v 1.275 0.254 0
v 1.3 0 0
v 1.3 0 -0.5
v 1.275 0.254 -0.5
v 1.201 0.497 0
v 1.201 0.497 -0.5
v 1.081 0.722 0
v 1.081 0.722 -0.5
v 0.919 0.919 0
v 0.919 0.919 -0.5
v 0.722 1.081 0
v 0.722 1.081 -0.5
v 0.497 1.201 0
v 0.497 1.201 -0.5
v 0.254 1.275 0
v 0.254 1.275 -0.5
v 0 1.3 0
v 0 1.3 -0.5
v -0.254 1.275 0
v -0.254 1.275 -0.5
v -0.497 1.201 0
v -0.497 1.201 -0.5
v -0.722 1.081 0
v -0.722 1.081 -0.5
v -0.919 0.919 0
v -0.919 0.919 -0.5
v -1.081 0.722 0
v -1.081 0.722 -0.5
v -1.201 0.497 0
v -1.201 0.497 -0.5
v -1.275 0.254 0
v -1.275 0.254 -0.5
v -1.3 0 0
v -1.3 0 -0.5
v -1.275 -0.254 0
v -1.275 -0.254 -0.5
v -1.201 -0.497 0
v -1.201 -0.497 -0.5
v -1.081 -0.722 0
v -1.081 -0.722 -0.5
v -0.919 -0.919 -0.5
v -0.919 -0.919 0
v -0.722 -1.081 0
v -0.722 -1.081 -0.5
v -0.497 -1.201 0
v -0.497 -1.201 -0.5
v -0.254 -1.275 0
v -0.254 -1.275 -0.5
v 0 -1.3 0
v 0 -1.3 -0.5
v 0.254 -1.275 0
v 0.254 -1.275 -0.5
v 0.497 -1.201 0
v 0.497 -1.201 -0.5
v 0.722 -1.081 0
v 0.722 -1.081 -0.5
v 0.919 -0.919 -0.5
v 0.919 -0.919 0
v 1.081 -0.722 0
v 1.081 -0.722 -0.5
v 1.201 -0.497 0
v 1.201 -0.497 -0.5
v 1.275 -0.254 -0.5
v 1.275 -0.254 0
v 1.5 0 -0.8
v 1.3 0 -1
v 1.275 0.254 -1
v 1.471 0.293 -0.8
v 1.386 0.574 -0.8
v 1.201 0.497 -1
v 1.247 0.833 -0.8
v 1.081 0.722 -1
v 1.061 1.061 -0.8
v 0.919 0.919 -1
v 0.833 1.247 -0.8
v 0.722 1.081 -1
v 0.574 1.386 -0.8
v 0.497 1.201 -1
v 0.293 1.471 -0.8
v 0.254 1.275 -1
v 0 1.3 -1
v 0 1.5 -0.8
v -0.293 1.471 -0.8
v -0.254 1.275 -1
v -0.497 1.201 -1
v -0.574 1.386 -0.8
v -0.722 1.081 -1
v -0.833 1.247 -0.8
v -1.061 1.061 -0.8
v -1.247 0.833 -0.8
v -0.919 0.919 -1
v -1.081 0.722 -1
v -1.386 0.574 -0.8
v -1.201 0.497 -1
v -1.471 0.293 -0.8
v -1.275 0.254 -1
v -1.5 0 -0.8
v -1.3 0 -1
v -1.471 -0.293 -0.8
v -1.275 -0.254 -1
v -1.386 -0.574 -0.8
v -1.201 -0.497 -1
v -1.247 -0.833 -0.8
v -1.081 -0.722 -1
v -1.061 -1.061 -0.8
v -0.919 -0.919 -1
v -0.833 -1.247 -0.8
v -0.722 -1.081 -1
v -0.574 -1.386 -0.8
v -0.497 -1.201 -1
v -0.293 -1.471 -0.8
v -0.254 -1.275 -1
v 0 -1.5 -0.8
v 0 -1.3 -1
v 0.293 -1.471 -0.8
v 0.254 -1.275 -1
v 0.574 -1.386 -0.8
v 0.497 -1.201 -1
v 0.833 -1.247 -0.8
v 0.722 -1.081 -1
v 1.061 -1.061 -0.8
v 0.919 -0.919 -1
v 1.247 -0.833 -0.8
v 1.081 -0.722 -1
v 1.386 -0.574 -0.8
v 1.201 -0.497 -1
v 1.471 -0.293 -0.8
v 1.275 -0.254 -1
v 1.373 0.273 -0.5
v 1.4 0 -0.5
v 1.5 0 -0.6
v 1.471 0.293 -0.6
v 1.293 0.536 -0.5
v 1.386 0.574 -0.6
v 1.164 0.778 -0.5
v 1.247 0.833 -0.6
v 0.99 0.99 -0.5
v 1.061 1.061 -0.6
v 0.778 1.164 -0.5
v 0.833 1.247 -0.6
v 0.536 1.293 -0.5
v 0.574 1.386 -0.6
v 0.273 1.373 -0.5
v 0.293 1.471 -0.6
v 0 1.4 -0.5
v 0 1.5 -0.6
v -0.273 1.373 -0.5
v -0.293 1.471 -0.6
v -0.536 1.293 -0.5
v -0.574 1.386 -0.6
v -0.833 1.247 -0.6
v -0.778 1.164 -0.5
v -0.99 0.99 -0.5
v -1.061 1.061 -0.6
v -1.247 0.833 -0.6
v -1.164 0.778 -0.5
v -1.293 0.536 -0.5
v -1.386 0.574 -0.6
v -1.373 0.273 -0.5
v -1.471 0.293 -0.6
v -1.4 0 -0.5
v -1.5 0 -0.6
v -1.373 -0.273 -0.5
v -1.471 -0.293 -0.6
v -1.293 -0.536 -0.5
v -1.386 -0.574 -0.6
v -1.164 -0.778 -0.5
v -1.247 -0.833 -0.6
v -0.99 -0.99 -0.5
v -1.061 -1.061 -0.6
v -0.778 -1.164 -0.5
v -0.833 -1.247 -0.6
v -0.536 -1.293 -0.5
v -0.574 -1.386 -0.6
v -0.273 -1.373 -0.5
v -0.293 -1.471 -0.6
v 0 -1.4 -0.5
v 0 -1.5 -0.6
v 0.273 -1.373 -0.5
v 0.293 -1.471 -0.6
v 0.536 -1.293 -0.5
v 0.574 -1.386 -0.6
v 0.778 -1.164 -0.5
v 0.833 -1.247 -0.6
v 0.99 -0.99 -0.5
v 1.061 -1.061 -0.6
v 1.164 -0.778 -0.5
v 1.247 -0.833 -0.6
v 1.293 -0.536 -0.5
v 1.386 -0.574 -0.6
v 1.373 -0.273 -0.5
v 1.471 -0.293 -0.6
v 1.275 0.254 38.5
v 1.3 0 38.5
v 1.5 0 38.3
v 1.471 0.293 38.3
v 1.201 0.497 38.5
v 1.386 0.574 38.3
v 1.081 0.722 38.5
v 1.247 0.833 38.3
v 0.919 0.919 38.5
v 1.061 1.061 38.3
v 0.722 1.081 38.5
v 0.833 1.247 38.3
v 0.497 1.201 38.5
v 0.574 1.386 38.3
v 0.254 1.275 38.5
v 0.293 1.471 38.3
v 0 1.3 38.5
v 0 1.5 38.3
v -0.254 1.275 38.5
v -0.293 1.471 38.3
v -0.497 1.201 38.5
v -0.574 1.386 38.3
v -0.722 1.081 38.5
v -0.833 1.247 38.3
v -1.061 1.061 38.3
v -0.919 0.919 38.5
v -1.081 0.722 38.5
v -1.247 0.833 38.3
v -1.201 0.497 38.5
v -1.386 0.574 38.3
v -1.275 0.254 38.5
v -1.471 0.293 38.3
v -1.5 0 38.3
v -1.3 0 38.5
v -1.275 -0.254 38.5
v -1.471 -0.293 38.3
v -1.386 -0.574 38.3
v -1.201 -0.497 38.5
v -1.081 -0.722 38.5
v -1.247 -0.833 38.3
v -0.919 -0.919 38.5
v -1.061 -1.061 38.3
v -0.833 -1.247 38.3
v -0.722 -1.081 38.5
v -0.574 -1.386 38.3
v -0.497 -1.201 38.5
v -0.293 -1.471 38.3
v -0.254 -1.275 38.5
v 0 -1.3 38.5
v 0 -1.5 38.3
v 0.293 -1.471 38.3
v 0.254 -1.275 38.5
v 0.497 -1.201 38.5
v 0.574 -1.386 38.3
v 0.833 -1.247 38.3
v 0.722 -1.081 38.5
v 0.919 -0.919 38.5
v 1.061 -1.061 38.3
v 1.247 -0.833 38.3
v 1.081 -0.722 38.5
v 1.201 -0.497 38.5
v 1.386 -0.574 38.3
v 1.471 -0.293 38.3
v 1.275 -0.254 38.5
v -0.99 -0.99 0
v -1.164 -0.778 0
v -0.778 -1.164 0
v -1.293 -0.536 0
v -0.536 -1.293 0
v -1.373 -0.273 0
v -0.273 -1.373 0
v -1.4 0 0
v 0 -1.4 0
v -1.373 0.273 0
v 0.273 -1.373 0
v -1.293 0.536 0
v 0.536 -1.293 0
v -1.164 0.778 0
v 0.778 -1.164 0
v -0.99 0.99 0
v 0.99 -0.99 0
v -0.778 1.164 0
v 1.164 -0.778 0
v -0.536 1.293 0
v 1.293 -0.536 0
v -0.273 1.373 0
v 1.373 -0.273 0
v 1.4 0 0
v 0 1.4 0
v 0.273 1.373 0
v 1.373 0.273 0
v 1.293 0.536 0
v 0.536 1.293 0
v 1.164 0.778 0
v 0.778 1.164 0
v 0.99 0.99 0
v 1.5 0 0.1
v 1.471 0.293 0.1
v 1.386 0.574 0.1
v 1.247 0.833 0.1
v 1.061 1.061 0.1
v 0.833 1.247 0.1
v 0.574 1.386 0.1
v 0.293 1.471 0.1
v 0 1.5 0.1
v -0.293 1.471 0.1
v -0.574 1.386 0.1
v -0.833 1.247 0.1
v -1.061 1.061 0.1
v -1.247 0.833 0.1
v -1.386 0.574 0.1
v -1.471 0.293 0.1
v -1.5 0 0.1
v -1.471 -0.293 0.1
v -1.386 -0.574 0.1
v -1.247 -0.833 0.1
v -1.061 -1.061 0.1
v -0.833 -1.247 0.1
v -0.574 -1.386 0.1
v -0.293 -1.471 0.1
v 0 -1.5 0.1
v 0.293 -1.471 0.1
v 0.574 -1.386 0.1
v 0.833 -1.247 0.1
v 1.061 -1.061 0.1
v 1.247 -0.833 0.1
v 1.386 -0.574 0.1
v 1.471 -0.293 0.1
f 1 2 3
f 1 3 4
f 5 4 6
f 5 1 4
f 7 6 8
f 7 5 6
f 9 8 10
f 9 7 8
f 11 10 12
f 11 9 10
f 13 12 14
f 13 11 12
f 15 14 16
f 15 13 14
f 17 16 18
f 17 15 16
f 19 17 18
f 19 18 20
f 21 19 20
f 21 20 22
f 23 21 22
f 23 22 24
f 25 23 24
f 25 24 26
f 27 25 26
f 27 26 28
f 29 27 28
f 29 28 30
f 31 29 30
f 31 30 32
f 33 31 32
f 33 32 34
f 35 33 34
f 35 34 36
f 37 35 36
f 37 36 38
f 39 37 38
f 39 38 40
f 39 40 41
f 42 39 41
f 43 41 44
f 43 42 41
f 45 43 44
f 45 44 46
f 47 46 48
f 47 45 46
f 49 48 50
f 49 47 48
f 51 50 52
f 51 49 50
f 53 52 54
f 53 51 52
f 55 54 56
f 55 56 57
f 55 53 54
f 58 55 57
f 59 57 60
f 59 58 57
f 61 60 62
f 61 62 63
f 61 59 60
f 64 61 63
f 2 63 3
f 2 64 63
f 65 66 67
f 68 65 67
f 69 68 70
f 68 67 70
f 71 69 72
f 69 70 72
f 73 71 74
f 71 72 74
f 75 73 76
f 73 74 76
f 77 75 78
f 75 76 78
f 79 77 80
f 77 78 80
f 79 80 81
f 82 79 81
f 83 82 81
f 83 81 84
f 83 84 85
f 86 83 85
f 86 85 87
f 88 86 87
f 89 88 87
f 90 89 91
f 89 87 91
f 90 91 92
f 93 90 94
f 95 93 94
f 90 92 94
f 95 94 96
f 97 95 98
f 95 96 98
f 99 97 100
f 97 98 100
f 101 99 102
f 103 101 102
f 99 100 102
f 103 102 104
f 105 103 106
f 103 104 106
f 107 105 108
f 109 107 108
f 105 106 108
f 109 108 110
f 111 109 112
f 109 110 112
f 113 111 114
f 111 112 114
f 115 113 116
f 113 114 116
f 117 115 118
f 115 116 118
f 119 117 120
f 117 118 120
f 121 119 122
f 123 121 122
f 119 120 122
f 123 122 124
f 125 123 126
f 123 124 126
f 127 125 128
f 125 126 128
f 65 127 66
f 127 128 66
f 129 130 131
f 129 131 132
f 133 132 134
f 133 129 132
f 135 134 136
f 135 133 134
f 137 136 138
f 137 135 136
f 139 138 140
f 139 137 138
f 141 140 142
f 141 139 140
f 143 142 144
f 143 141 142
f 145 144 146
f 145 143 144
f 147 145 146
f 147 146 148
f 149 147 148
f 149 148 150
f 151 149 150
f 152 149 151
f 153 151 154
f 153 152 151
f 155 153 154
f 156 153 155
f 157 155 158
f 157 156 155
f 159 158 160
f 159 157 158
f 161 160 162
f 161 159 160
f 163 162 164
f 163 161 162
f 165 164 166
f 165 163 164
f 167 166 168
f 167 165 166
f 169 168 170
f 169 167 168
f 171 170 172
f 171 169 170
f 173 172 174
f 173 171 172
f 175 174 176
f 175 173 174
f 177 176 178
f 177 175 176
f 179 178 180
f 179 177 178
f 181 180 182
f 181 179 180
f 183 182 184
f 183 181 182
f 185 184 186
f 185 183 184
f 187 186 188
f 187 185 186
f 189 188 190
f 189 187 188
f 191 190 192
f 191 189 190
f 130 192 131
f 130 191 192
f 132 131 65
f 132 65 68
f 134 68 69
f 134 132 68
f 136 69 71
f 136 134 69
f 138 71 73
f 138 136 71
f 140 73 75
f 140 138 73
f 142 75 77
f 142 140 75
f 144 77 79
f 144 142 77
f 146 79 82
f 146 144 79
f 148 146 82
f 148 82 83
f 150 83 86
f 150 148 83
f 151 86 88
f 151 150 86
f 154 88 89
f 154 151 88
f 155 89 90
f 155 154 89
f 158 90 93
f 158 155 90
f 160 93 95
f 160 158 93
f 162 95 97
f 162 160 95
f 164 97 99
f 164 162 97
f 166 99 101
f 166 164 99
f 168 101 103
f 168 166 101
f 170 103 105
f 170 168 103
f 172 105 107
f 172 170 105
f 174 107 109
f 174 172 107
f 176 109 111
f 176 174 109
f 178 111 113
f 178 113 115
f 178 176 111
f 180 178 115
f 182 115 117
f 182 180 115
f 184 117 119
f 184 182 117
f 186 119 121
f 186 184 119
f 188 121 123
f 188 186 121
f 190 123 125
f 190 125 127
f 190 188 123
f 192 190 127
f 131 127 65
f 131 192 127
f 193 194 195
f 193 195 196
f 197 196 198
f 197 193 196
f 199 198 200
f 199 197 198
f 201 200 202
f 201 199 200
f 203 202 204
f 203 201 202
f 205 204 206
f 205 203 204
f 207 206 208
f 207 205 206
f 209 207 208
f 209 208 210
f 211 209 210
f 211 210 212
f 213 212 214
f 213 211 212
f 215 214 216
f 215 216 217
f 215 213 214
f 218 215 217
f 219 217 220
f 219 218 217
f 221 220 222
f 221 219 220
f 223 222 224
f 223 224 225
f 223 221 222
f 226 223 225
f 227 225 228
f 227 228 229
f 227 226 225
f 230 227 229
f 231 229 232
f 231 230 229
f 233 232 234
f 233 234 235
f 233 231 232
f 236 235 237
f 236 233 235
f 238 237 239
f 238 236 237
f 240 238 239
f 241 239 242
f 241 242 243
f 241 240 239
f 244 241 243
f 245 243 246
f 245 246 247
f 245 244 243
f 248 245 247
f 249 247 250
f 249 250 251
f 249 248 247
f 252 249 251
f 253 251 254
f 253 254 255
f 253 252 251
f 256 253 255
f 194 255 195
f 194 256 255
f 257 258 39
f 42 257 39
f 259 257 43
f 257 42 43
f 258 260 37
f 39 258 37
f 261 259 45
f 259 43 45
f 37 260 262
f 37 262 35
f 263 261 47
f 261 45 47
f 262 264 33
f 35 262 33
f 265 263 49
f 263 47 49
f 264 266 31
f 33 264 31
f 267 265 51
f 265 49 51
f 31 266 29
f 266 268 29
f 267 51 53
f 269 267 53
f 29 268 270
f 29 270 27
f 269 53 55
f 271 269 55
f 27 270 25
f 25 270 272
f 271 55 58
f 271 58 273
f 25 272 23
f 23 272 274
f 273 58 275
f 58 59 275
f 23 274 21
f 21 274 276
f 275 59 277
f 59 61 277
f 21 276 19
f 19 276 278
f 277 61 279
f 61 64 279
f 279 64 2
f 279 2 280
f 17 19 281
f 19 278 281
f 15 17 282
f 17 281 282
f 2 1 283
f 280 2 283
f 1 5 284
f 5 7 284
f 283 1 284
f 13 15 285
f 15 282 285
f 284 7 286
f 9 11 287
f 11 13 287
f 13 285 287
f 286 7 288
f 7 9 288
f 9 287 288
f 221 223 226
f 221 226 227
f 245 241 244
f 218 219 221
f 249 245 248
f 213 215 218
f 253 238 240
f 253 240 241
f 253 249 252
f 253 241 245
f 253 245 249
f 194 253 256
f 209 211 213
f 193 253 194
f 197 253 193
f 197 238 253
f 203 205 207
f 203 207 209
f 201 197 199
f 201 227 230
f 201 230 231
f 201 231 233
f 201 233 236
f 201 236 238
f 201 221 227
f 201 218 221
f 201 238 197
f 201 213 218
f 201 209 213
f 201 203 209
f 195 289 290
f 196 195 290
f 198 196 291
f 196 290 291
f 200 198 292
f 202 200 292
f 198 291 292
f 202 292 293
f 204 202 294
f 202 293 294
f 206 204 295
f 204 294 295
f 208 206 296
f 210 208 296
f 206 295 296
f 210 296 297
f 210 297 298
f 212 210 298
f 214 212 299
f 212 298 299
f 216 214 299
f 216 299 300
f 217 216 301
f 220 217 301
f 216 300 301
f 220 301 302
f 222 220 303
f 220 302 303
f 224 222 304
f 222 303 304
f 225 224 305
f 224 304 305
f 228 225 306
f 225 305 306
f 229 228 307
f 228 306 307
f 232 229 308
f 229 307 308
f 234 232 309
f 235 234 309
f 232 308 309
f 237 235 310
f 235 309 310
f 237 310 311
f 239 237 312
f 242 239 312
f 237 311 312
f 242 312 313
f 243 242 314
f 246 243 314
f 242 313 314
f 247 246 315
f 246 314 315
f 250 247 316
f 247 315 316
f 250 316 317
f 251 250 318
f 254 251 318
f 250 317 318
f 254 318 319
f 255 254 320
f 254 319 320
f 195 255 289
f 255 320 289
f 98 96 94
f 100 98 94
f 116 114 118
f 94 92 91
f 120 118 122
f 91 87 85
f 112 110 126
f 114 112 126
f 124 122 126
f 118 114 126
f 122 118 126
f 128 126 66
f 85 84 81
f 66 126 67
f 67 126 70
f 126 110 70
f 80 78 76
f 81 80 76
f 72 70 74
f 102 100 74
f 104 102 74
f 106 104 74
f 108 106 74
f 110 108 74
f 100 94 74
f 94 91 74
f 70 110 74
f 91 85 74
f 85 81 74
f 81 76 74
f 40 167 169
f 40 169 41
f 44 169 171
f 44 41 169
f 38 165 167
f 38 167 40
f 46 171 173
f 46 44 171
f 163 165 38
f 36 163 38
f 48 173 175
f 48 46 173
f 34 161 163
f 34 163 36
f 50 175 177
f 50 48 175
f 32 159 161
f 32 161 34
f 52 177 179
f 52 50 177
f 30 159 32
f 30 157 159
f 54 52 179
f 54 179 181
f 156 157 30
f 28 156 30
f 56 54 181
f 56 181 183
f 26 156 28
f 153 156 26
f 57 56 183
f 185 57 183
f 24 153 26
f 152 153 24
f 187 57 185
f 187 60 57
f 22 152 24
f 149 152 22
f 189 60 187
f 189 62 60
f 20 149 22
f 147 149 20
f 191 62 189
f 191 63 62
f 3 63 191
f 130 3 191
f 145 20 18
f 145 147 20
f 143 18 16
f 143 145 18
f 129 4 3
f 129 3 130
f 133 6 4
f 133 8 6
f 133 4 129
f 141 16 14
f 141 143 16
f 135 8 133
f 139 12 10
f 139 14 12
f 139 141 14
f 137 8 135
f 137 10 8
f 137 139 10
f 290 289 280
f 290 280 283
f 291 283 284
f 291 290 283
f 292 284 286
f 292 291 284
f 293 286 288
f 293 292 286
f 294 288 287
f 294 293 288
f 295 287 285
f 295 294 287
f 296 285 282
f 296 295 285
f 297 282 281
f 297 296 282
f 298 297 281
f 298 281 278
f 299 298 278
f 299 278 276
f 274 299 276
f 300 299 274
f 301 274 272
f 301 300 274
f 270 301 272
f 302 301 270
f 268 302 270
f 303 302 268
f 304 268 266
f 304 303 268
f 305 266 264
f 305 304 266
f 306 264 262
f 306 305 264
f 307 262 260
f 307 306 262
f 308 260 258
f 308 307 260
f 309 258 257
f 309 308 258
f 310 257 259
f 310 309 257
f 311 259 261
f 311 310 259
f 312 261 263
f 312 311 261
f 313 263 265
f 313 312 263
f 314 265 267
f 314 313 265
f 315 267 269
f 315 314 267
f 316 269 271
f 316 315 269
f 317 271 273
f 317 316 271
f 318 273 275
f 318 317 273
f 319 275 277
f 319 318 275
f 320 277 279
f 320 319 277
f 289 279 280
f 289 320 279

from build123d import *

# Parameters (mm, degrees)
F0_R     = 1.5
F0_R_2   = 1.3
F1_DEPTH = 38.5
F2_DEPTH = 1
F3_START = -0.5
F3_DEPTH = 0.5
F4_SIZE  = 0.2
F5_SIZE  = 0.1


with BuildPart() as f1:
    # F0 (on Top) → F1 (new body)
    with BuildSketch(Plane.XY):
        Circle(F0_R)
        Circle(F0_R_2, mode=Mode.SUBTRACT)
        Circle(F0_R_2)
    extrude(amount=F1_DEPTH)

    # F0 (on Top) → F2 (join)
    with BuildSketch(Plane.XY):
        Circle(F0_R_2)
    extrude(amount=-F2_DEPTH)

    # F0 (on Top) → F3 (join)
    with BuildSketch(Plane.XY.offset(F3_START)):
        Circle(F0_R)
        Circle(F0_R_2, mode=Mode.SUBTRACT)
    extrude(amount=-F3_DEPTH)

    # F4
    f4_edges = [f1.edges().sort_by_distance(p)[0] for p in [
        (-1.5, 0, -1),
        (-1.5, 0, 38.5),
    ]]
    chamfer(f4_edges, length=F4_SIZE)

    # F5
    f5_edges = [f1.edges().sort_by_distance(p)[0] for p in [
        (-1.5, 0, -0.5),
        (-1.5, 0, 0),
    ]]
    chamfer(f5_edges, length=F5_SIZE)


solid = f1.part
